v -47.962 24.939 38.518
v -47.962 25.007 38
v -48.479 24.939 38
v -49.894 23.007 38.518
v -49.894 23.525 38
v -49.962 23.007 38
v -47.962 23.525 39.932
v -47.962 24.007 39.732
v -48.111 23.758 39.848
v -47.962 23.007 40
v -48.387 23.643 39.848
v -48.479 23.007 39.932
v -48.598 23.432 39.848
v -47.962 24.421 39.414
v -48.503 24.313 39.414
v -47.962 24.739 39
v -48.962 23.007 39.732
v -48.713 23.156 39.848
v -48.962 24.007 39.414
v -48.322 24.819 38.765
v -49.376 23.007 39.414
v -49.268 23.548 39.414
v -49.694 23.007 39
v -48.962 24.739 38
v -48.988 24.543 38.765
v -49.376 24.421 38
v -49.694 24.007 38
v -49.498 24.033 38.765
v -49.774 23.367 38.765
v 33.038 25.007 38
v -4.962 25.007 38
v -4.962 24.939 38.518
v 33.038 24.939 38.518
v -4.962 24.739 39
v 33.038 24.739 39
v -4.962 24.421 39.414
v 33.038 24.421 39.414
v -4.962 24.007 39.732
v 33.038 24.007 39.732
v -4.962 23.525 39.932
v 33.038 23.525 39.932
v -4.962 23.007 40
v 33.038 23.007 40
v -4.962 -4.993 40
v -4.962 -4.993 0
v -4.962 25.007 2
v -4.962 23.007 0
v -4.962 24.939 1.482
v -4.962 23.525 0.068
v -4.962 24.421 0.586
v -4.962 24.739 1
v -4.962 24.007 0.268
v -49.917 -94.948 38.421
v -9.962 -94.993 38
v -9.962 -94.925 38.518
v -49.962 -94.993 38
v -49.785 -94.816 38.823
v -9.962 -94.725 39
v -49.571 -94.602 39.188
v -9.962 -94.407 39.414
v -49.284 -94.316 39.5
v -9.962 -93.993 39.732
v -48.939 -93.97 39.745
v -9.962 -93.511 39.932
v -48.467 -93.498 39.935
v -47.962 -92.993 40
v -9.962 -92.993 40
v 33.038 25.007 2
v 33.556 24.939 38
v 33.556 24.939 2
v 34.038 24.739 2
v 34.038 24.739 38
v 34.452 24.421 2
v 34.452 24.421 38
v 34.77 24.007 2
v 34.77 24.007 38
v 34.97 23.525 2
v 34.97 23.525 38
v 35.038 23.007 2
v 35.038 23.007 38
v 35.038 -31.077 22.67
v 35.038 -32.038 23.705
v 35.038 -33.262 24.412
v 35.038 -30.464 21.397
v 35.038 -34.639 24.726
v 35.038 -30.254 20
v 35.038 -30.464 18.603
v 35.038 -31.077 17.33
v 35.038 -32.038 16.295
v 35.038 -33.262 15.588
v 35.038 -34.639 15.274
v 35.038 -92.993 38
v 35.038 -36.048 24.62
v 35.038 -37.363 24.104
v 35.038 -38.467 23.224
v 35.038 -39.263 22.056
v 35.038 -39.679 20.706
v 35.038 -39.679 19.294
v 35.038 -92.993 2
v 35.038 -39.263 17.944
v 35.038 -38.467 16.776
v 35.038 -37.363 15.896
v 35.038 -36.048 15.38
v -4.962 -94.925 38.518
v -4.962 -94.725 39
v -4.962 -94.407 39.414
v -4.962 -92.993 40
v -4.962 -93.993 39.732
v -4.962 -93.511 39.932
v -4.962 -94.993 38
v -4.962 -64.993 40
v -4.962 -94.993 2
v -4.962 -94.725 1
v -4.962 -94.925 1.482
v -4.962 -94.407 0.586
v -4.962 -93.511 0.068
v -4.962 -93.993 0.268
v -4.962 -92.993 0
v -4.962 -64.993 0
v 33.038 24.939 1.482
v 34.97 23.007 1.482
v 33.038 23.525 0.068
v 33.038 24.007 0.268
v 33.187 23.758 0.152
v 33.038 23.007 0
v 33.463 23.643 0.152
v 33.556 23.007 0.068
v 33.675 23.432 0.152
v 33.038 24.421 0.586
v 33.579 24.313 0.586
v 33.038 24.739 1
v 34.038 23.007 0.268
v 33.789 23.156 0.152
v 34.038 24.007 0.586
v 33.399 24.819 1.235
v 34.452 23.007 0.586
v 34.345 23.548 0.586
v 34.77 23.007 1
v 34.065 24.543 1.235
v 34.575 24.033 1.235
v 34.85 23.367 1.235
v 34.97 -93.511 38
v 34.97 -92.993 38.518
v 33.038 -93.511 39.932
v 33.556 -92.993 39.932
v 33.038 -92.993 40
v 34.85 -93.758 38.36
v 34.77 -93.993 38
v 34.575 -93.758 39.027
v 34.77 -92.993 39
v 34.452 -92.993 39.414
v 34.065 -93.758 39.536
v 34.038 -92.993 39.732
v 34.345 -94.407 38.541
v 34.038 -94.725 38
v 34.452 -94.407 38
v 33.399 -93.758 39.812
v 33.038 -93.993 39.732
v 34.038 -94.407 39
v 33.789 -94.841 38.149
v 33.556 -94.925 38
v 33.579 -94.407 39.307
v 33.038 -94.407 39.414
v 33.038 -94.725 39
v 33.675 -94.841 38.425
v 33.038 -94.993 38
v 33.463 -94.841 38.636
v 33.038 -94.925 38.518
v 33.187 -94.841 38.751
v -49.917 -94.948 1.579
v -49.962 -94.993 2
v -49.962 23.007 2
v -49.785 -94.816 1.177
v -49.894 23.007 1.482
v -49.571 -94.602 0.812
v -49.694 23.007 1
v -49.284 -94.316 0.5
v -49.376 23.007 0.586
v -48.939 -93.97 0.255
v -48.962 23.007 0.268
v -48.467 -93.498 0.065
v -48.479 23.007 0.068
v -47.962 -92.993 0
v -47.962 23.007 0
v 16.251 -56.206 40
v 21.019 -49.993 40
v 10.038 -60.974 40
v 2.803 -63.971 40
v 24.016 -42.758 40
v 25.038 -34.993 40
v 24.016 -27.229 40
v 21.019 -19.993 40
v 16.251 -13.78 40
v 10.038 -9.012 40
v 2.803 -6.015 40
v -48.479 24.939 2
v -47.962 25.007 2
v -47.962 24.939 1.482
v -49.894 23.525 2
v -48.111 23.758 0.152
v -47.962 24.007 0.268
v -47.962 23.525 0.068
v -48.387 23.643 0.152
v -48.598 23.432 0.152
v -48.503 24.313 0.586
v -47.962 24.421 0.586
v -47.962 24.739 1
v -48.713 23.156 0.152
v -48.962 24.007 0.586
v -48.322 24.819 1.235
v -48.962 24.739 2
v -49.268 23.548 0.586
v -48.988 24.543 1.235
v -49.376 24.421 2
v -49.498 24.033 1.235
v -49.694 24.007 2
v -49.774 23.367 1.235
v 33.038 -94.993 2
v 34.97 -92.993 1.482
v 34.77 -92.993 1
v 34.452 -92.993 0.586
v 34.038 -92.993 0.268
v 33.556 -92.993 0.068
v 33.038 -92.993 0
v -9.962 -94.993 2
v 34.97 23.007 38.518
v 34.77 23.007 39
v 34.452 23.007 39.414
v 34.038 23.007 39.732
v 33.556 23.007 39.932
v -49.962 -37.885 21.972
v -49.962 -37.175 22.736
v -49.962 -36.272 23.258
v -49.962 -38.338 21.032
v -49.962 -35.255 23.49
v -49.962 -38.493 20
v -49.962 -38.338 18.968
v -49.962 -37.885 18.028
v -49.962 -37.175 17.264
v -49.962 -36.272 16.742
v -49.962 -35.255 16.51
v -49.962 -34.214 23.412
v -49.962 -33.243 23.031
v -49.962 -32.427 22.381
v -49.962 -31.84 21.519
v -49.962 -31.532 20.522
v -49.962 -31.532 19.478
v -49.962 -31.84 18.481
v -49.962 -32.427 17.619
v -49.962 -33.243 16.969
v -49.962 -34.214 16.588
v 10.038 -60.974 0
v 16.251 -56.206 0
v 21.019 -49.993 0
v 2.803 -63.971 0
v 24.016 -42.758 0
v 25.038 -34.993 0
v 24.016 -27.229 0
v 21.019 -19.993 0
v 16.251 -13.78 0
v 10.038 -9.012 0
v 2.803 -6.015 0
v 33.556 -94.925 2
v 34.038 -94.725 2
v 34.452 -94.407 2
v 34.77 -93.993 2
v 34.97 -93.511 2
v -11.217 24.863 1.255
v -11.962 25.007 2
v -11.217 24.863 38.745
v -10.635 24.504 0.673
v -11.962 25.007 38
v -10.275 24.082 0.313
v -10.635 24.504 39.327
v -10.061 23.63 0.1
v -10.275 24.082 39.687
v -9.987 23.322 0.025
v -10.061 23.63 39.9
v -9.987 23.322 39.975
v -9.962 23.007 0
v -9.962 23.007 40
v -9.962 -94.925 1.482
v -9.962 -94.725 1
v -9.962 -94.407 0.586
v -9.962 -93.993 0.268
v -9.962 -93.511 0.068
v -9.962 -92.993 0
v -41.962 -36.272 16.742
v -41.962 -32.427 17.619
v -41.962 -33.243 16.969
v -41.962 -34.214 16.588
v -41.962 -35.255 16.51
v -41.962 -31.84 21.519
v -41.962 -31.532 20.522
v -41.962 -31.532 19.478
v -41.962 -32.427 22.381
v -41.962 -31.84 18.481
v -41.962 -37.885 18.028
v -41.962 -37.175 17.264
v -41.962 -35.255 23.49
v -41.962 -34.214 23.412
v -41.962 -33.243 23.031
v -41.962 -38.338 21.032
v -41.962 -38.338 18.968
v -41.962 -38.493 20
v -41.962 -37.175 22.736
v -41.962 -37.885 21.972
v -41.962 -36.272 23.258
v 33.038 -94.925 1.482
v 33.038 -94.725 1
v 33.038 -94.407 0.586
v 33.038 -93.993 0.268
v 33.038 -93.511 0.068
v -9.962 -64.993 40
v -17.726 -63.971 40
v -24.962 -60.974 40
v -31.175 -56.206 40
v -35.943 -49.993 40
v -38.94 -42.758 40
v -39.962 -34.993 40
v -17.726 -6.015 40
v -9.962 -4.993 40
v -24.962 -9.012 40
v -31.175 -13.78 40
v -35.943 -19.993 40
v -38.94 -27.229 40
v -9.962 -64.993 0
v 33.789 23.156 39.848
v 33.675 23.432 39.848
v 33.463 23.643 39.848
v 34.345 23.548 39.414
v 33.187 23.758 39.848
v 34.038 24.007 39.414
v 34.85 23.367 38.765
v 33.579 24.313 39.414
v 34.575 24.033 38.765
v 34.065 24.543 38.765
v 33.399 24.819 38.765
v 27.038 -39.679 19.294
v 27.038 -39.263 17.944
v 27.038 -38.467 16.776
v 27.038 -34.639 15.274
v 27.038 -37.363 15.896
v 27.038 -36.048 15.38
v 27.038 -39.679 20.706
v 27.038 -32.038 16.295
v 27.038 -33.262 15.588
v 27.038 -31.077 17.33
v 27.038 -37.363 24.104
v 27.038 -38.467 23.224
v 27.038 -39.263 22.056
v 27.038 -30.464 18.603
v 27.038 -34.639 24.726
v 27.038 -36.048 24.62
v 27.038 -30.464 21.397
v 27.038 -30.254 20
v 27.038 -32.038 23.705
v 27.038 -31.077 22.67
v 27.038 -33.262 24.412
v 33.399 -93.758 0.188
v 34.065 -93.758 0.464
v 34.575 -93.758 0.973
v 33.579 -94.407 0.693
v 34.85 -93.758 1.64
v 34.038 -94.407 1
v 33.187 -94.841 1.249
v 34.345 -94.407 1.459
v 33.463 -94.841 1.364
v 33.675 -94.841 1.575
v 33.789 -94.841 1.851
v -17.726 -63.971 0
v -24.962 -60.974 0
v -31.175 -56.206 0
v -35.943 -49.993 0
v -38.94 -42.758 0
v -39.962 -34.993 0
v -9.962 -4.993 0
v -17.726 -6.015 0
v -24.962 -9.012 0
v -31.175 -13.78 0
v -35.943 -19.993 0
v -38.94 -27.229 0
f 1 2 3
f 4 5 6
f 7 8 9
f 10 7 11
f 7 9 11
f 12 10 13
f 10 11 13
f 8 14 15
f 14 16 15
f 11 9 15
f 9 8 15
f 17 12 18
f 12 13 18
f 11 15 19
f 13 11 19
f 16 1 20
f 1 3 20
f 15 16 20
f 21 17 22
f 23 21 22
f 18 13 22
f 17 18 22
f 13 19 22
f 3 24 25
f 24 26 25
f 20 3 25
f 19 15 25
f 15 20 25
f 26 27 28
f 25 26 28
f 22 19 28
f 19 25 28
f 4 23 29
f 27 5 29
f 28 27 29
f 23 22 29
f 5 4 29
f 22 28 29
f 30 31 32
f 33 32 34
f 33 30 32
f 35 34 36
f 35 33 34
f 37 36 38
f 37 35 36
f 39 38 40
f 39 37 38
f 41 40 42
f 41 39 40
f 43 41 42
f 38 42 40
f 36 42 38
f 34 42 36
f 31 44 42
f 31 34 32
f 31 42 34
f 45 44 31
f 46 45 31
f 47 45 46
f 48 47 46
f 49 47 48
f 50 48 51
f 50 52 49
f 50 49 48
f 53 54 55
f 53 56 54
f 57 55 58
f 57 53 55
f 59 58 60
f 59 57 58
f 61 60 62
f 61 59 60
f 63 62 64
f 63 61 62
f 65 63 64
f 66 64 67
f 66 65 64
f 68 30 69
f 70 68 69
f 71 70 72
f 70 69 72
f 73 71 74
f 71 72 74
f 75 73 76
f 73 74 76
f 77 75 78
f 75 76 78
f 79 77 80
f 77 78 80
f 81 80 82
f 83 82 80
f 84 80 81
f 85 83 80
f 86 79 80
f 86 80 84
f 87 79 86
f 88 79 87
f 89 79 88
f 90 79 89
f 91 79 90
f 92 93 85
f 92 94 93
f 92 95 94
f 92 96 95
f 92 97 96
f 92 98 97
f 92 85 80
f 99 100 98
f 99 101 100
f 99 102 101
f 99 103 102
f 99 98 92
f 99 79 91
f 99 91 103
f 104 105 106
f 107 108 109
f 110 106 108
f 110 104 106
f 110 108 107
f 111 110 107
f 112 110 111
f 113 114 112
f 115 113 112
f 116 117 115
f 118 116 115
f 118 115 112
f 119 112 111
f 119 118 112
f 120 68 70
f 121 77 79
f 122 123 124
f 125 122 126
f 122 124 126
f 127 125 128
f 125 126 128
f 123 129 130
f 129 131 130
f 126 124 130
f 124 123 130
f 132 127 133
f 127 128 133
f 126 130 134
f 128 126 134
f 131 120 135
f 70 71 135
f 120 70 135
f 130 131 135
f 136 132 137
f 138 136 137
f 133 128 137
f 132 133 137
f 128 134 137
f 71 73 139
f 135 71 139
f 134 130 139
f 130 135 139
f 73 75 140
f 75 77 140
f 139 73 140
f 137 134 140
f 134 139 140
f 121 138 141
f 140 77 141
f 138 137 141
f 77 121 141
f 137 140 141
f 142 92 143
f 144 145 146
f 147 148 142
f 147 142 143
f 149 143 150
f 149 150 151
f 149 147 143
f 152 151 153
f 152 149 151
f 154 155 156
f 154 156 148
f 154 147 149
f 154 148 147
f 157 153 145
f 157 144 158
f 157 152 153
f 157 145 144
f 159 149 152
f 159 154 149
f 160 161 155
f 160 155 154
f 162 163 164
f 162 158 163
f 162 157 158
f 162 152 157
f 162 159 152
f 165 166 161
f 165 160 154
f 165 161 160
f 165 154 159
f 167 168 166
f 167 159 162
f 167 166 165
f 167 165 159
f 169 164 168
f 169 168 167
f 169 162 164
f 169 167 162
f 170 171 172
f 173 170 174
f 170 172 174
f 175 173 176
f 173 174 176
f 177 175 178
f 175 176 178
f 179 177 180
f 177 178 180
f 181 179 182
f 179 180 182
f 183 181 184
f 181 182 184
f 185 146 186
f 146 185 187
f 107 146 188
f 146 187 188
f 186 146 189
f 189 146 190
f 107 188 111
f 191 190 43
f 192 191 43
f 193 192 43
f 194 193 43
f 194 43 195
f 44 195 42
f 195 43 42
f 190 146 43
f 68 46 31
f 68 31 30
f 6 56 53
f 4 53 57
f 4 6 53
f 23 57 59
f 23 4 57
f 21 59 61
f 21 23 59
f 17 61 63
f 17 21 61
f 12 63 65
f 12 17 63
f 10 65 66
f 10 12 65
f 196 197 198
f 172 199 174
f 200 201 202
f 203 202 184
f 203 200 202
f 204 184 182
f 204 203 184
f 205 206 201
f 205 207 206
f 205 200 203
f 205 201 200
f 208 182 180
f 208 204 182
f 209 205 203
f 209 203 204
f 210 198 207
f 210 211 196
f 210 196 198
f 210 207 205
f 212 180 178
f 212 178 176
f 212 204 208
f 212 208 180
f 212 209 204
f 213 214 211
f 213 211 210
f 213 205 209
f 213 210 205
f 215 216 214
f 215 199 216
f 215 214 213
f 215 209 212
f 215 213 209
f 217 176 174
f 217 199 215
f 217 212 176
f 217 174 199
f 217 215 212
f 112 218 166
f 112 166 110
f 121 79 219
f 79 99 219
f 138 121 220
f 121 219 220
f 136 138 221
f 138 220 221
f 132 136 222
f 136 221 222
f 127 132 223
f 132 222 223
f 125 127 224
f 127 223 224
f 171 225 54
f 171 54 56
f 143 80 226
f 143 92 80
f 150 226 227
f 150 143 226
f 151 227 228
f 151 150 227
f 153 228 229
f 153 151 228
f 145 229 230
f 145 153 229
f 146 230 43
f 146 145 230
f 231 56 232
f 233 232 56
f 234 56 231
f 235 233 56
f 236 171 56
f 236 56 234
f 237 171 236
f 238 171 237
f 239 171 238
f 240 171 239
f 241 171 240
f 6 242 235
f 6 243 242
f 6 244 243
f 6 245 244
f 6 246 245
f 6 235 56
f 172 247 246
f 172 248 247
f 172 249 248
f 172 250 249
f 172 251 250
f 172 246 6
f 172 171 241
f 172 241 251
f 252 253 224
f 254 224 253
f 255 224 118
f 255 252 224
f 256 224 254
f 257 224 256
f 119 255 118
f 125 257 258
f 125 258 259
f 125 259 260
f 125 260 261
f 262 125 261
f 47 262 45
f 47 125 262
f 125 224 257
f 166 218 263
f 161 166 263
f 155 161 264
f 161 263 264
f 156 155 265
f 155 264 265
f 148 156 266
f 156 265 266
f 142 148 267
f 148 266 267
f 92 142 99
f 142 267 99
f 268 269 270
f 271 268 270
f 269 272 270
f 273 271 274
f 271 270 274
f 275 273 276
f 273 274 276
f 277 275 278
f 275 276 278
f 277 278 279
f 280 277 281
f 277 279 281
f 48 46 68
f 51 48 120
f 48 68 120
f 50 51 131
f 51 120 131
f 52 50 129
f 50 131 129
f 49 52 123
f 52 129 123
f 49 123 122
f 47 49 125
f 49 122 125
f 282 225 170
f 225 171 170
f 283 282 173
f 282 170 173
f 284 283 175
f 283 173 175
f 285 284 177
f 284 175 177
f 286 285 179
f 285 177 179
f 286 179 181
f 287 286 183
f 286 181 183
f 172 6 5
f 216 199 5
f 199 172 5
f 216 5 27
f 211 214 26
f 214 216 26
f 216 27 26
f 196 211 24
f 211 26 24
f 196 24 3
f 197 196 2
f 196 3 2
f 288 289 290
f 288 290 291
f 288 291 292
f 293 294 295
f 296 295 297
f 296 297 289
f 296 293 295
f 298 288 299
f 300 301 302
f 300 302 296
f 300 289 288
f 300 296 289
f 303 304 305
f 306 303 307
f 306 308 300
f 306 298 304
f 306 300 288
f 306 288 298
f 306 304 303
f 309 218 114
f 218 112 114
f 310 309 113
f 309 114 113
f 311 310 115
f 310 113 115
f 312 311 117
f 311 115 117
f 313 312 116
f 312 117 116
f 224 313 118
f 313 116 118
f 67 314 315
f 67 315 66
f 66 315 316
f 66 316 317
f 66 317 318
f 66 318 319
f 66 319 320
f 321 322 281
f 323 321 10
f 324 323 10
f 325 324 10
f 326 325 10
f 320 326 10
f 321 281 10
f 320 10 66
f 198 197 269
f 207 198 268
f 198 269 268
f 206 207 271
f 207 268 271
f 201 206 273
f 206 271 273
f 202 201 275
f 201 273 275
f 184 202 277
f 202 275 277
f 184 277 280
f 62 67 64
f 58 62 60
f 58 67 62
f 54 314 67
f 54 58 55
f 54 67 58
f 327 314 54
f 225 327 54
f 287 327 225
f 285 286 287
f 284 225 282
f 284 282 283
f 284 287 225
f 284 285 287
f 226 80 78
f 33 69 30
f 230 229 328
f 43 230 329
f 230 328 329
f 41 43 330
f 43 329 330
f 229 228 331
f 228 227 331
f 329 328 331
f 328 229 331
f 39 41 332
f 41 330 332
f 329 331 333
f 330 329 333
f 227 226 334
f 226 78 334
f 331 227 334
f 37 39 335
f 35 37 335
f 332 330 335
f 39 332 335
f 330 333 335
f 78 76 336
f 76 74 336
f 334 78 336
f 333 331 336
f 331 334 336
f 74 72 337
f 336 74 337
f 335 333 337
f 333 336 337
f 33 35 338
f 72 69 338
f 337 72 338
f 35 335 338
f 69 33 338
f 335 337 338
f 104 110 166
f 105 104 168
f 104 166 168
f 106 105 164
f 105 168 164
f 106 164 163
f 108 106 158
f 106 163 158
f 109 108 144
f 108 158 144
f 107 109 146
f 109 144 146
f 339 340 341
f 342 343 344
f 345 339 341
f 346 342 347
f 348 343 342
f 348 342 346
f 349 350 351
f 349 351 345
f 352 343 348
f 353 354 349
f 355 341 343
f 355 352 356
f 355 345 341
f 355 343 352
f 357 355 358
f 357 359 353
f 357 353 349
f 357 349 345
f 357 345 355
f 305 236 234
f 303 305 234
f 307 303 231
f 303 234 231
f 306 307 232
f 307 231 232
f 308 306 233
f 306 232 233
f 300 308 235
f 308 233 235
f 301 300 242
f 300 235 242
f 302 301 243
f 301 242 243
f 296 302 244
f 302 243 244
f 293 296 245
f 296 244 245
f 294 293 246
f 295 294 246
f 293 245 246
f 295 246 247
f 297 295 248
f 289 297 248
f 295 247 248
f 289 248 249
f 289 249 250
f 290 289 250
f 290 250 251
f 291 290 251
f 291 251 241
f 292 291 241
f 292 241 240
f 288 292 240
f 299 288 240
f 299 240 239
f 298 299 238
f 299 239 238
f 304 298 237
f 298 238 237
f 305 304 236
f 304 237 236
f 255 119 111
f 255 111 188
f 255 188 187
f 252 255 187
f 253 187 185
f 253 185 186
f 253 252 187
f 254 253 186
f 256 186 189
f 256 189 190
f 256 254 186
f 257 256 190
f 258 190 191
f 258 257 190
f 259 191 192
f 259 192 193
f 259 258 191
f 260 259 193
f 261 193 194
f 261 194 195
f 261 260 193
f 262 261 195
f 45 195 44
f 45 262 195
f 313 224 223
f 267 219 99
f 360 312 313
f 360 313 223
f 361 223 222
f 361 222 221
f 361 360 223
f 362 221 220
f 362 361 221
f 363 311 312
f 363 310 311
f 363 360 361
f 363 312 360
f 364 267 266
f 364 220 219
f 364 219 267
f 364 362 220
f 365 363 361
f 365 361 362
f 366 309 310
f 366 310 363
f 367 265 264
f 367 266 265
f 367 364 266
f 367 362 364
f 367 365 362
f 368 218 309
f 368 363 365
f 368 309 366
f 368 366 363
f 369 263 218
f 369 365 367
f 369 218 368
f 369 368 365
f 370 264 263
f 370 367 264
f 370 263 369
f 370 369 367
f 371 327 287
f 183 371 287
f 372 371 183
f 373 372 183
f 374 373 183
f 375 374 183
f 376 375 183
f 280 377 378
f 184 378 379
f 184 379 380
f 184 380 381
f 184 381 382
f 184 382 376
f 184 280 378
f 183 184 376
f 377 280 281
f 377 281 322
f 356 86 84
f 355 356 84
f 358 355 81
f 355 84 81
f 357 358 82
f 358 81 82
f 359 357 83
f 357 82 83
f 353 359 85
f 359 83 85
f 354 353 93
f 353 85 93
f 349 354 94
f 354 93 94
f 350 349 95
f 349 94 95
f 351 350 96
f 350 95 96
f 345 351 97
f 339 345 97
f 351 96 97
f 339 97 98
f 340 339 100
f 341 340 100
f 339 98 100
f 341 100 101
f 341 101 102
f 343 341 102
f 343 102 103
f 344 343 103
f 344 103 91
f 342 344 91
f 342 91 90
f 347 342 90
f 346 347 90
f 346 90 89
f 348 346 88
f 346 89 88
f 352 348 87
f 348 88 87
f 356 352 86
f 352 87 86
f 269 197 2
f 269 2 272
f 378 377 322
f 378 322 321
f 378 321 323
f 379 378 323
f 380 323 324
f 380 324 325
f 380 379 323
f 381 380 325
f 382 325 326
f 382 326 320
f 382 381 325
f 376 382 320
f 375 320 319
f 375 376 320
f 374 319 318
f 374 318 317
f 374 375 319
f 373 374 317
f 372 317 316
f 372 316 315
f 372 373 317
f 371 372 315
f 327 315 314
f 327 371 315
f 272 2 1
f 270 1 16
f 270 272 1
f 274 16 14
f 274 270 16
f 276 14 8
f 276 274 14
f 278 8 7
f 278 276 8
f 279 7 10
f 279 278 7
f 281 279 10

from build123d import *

# Parameters (mm, degrees)
BOSS_EXTRUDE1_DEPTH   = 40
BOSS_EXTRUDE1_2_DEPTH = 40
FILLET1_R             = 2
FILLET2_R             = 2
FILLET3_R             = 2
SKETCH2_R             = 3.5
CUT_EXTRUDE2_DEPTH    = 8
SKETCH3_R             = 4.739315761
CUT_EXTRUDE3_DEPTH    = 8


with BuildPart() as part:
    # Sketch1 → Boss-Extrude1 (new body)
    with BuildSketch(Plane.XY):
        with BuildLine():
            Line((-9.961849725, -64.993102173), (-9.961849725, -94.993102173))
            Line((-9.961849725, -94.993102173), (-49.961849725, -94.993102173))
            Line((-49.961849725, -94.993102173), (-49.961849725, 25.006897827))
            Line((-49.961849725, 25.006897827), (-9.961849725, 25.006897827))
            Line((-9.961849725, 25.006897827), (-9.961849725, -4.993102173))
            ThreePointArc((-9.961849725, -4.993102173), (-39.961849725, -34.993102173), (-9.961849725, -64.993102173))
        make_face()
    extrude(amount=BOSS_EXTRUDE1_DEPTH)

    # Fillet2
    fillet2_edges = [part.edges().sort_by_distance(p)[0] for p in [
        (-49.961849725, 25.006897827, 20),
        (-9.961849725, 25.006897827, 20),
        (-29.961849725, 25.006897827, 40),
        (-49.961849725, -34.993102173, 40),
        (-29.961849725, 25.006897827, 0),
        (-29.961849725, -94.993102173, 40),
        (-29.961849725, -94.993102173, 0),
        (-49.961849725, -34.993102173, 0),
    ]]
    fillet(fillet2_edges, radius=FILLET2_R)

    # Sketch2 → Cut-Extrude2 (cut)
    with BuildSketch(Plane.ZY.offset(49.961849725)):
        with Locations(Location((20, -34.993102173, 0), (0, 0, 270))):
            Circle(SKETCH2_R)
    extrude(amount=-CUT_EXTRUDE2_DEPTH, mode=Mode.SUBTRACT)


with BuildPart() as body_2:
    # Sketch1 → Boss-Extrude1 2 (new body)
    with BuildSketch(Plane.XY):
        with BuildLine():
            Line((-4.961849725, 25.006897827), (35.038150275, 25.006897827))
            Line((35.038150275, 25.006897827), (35.038150275, -94.993102173))
            Line((35.038150275, -94.993102173), (-4.961849725, -94.993102173))
            Line((-4.961849725, -94.993102173), (-4.961849725, -64.993102173))
            ThreePointArc((-4.961849725, -64.993102173), (25.038150275, -34.993102173), (-4.961849725, -4.993102173))
            Line((-4.961849725, -4.993102173), (-4.961849725, 25.006897827))
        make_face()
    extrude(amount=BOSS_EXTRUDE1_2_DEPTH)

    # Fillet1
    fillet1_edges = [body_2.edges().sort_by_distance(p)[0] for p in [
        (35.038150275, 25.006897827, 20),
        (35.038150275, -34.993102173, 40),
        (15.038150275, 25.006897827, 40),
        (15.038150275, 25.006897827, 0),
        (35.038150275, -34.993102173, 0),
        (15.038150275, -94.993102173, 0),
    ]]
    fillet(fillet1_edges, radius=FILLET1_R)

    # Fillet3
    # the kernel refuses this fillet: 2 mm, written as the material it takes off along each edge
    with BuildSketch(Plane(origin=(33.038150275, -92.993102173, 2), x_dir=(1, 0, 0), z_dir=(0, -1, 0))) as fillet3_piece_1_section:
        Polygon((0, 0), (FILLET3_R, 0), (FILLET3_R, -FILLET3_R), (0, -FILLET3_R), align=None)
    fillet3_piece_1 = extrude(amount=FILLET3_R, mode=Mode.PRIVATE)
    fillet3_piece_1 = fillet3_piece_1 - Plane(origin=(33.038150275, -92.993102173, 2), x_dir=(-0.7071067811865475, 0, 0.7071067811865475), z_dir=(0, -1, 0)) * Sphere(FILLET3_R, mode=Mode.PRIVATE)
    add(fillet3_piece_1, mode=Mode.SUBTRACT)
    with BuildSketch(Plane(origin=(33.038150275, -94.993102173, 40), x_dir=(0, 1, 0), z_dir=(-1, 0, 0))) as fillet3_piece_2:
        with BuildLine():
            CenterArc((FILLET3_R, FILLET3_R), FILLET3_R, 180, 90)
            Line((0, FILLET3_R), (0, 0))
            Line((0, 0), (FILLET3_R, 0))
        make_face()
    extrude(amount=43, mode=Mode.SUBTRACT)
    with BuildSketch(Plane(origin=(35.038150275, -94.993102173, 2), x_dir=(-1, 0, 0), z_dir=(0, 0, 1))) as fillet3_piece_3:
        with BuildLine():
            CenterArc((FILLET3_R, -FILLET3_R), FILLET3_R, 90, 90)
            Line((0, -FILLET3_R), (0, 0))
            Line((0, 0), (FILLET3_R, 0))
        make_face()
    extrude(amount=36, mode=Mode.SUBTRACT)
    with BuildSketch(Plane(origin=(33.038150275, -94.993102173, 38), x_dir=(1, 0, 0), z_dir=(0, 0, -1))) as fillet3_piece_4:
        with BuildLine():
            CenterArc((2 - FILLET3_R, -FILLET3_R), FILLET3_R, 0, 90)
            Line((2 - FILLET3_R, 0), (2, 0))
            Line((2, 0), (2, -FILLET3_R))
        make_face()
    revolve(axis=Axis((33.038150275, -94.993102173, 38), (0, -1, 0)), revolution_arc=90, mode=Mode.SUBTRACT)

    # Sketch3 → Cut-Extrude3 (cut)
    with BuildSketch(Plane(origin=(35.038150275, 0, 0), x_dir=(0, 0, -1), z_dir=(1, 0, 0))):
        with Locations(Location((-20, -34.993102173, 0), (0, 0, 90))):
            Circle(SKETCH3_R)
    extrude(amount=-CUT_EXTRUDE3_DEPTH, mode=Mode.SUBTRACT)


solid = Compound([part.part, body_2.part])
